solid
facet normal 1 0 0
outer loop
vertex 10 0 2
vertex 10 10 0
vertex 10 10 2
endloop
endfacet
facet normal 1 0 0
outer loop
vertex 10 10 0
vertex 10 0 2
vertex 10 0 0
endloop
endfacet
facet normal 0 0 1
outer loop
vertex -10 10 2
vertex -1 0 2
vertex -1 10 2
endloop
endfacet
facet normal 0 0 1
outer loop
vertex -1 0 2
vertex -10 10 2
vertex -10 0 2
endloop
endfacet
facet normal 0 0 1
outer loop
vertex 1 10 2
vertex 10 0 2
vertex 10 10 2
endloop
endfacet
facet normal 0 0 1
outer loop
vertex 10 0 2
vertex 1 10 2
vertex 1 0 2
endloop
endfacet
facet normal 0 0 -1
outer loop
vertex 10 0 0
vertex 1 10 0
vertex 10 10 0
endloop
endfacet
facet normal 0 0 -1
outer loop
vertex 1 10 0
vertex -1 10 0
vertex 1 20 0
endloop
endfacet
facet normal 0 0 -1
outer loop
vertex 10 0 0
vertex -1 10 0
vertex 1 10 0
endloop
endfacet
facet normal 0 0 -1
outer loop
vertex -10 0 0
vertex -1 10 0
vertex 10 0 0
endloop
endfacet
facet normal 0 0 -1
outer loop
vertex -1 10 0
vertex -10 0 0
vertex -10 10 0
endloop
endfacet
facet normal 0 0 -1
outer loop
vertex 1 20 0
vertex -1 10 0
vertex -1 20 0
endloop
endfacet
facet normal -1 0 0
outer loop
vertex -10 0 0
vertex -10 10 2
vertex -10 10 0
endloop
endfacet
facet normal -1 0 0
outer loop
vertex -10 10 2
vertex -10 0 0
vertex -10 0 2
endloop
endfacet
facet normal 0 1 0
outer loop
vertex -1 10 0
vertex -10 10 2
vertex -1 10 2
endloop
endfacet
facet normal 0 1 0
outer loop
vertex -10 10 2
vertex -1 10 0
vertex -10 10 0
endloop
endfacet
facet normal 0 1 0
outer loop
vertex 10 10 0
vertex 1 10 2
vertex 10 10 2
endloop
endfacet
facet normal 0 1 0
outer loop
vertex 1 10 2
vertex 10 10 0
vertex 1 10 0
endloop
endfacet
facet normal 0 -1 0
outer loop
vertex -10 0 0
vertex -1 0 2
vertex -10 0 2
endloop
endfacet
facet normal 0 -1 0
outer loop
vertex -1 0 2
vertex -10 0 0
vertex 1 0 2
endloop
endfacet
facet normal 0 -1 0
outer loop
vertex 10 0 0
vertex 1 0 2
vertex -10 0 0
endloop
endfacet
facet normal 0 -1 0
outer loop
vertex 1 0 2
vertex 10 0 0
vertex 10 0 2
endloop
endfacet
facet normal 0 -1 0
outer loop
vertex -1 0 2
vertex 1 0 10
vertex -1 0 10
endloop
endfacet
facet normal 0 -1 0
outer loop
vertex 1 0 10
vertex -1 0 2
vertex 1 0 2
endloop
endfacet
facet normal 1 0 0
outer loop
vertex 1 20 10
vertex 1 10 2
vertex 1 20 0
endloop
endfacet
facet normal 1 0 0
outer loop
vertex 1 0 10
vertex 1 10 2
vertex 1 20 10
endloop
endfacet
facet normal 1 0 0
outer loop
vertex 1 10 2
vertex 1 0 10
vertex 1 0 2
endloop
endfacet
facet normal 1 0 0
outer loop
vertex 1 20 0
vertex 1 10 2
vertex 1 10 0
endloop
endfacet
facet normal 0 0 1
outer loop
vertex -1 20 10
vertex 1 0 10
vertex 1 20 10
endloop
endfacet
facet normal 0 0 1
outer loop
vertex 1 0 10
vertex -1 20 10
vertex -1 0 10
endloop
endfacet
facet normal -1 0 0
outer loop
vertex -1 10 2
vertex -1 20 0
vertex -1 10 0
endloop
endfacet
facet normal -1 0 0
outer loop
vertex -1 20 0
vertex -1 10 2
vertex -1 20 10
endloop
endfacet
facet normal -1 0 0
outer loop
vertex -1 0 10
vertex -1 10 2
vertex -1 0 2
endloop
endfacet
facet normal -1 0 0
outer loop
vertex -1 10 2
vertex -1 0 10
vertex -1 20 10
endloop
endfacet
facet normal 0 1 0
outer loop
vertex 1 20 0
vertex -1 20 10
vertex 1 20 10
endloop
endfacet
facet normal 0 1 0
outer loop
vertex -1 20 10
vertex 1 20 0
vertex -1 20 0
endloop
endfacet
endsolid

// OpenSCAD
//

xx = 20;
yy = 10;
zz = 2;
wall = 2;

union() {
    translate([-xx/2, 0,0]) cube([xx,yy,zz]);
    
    translate([-wall/2, 0,0]) cube([wall,yy*2,10]);
}
